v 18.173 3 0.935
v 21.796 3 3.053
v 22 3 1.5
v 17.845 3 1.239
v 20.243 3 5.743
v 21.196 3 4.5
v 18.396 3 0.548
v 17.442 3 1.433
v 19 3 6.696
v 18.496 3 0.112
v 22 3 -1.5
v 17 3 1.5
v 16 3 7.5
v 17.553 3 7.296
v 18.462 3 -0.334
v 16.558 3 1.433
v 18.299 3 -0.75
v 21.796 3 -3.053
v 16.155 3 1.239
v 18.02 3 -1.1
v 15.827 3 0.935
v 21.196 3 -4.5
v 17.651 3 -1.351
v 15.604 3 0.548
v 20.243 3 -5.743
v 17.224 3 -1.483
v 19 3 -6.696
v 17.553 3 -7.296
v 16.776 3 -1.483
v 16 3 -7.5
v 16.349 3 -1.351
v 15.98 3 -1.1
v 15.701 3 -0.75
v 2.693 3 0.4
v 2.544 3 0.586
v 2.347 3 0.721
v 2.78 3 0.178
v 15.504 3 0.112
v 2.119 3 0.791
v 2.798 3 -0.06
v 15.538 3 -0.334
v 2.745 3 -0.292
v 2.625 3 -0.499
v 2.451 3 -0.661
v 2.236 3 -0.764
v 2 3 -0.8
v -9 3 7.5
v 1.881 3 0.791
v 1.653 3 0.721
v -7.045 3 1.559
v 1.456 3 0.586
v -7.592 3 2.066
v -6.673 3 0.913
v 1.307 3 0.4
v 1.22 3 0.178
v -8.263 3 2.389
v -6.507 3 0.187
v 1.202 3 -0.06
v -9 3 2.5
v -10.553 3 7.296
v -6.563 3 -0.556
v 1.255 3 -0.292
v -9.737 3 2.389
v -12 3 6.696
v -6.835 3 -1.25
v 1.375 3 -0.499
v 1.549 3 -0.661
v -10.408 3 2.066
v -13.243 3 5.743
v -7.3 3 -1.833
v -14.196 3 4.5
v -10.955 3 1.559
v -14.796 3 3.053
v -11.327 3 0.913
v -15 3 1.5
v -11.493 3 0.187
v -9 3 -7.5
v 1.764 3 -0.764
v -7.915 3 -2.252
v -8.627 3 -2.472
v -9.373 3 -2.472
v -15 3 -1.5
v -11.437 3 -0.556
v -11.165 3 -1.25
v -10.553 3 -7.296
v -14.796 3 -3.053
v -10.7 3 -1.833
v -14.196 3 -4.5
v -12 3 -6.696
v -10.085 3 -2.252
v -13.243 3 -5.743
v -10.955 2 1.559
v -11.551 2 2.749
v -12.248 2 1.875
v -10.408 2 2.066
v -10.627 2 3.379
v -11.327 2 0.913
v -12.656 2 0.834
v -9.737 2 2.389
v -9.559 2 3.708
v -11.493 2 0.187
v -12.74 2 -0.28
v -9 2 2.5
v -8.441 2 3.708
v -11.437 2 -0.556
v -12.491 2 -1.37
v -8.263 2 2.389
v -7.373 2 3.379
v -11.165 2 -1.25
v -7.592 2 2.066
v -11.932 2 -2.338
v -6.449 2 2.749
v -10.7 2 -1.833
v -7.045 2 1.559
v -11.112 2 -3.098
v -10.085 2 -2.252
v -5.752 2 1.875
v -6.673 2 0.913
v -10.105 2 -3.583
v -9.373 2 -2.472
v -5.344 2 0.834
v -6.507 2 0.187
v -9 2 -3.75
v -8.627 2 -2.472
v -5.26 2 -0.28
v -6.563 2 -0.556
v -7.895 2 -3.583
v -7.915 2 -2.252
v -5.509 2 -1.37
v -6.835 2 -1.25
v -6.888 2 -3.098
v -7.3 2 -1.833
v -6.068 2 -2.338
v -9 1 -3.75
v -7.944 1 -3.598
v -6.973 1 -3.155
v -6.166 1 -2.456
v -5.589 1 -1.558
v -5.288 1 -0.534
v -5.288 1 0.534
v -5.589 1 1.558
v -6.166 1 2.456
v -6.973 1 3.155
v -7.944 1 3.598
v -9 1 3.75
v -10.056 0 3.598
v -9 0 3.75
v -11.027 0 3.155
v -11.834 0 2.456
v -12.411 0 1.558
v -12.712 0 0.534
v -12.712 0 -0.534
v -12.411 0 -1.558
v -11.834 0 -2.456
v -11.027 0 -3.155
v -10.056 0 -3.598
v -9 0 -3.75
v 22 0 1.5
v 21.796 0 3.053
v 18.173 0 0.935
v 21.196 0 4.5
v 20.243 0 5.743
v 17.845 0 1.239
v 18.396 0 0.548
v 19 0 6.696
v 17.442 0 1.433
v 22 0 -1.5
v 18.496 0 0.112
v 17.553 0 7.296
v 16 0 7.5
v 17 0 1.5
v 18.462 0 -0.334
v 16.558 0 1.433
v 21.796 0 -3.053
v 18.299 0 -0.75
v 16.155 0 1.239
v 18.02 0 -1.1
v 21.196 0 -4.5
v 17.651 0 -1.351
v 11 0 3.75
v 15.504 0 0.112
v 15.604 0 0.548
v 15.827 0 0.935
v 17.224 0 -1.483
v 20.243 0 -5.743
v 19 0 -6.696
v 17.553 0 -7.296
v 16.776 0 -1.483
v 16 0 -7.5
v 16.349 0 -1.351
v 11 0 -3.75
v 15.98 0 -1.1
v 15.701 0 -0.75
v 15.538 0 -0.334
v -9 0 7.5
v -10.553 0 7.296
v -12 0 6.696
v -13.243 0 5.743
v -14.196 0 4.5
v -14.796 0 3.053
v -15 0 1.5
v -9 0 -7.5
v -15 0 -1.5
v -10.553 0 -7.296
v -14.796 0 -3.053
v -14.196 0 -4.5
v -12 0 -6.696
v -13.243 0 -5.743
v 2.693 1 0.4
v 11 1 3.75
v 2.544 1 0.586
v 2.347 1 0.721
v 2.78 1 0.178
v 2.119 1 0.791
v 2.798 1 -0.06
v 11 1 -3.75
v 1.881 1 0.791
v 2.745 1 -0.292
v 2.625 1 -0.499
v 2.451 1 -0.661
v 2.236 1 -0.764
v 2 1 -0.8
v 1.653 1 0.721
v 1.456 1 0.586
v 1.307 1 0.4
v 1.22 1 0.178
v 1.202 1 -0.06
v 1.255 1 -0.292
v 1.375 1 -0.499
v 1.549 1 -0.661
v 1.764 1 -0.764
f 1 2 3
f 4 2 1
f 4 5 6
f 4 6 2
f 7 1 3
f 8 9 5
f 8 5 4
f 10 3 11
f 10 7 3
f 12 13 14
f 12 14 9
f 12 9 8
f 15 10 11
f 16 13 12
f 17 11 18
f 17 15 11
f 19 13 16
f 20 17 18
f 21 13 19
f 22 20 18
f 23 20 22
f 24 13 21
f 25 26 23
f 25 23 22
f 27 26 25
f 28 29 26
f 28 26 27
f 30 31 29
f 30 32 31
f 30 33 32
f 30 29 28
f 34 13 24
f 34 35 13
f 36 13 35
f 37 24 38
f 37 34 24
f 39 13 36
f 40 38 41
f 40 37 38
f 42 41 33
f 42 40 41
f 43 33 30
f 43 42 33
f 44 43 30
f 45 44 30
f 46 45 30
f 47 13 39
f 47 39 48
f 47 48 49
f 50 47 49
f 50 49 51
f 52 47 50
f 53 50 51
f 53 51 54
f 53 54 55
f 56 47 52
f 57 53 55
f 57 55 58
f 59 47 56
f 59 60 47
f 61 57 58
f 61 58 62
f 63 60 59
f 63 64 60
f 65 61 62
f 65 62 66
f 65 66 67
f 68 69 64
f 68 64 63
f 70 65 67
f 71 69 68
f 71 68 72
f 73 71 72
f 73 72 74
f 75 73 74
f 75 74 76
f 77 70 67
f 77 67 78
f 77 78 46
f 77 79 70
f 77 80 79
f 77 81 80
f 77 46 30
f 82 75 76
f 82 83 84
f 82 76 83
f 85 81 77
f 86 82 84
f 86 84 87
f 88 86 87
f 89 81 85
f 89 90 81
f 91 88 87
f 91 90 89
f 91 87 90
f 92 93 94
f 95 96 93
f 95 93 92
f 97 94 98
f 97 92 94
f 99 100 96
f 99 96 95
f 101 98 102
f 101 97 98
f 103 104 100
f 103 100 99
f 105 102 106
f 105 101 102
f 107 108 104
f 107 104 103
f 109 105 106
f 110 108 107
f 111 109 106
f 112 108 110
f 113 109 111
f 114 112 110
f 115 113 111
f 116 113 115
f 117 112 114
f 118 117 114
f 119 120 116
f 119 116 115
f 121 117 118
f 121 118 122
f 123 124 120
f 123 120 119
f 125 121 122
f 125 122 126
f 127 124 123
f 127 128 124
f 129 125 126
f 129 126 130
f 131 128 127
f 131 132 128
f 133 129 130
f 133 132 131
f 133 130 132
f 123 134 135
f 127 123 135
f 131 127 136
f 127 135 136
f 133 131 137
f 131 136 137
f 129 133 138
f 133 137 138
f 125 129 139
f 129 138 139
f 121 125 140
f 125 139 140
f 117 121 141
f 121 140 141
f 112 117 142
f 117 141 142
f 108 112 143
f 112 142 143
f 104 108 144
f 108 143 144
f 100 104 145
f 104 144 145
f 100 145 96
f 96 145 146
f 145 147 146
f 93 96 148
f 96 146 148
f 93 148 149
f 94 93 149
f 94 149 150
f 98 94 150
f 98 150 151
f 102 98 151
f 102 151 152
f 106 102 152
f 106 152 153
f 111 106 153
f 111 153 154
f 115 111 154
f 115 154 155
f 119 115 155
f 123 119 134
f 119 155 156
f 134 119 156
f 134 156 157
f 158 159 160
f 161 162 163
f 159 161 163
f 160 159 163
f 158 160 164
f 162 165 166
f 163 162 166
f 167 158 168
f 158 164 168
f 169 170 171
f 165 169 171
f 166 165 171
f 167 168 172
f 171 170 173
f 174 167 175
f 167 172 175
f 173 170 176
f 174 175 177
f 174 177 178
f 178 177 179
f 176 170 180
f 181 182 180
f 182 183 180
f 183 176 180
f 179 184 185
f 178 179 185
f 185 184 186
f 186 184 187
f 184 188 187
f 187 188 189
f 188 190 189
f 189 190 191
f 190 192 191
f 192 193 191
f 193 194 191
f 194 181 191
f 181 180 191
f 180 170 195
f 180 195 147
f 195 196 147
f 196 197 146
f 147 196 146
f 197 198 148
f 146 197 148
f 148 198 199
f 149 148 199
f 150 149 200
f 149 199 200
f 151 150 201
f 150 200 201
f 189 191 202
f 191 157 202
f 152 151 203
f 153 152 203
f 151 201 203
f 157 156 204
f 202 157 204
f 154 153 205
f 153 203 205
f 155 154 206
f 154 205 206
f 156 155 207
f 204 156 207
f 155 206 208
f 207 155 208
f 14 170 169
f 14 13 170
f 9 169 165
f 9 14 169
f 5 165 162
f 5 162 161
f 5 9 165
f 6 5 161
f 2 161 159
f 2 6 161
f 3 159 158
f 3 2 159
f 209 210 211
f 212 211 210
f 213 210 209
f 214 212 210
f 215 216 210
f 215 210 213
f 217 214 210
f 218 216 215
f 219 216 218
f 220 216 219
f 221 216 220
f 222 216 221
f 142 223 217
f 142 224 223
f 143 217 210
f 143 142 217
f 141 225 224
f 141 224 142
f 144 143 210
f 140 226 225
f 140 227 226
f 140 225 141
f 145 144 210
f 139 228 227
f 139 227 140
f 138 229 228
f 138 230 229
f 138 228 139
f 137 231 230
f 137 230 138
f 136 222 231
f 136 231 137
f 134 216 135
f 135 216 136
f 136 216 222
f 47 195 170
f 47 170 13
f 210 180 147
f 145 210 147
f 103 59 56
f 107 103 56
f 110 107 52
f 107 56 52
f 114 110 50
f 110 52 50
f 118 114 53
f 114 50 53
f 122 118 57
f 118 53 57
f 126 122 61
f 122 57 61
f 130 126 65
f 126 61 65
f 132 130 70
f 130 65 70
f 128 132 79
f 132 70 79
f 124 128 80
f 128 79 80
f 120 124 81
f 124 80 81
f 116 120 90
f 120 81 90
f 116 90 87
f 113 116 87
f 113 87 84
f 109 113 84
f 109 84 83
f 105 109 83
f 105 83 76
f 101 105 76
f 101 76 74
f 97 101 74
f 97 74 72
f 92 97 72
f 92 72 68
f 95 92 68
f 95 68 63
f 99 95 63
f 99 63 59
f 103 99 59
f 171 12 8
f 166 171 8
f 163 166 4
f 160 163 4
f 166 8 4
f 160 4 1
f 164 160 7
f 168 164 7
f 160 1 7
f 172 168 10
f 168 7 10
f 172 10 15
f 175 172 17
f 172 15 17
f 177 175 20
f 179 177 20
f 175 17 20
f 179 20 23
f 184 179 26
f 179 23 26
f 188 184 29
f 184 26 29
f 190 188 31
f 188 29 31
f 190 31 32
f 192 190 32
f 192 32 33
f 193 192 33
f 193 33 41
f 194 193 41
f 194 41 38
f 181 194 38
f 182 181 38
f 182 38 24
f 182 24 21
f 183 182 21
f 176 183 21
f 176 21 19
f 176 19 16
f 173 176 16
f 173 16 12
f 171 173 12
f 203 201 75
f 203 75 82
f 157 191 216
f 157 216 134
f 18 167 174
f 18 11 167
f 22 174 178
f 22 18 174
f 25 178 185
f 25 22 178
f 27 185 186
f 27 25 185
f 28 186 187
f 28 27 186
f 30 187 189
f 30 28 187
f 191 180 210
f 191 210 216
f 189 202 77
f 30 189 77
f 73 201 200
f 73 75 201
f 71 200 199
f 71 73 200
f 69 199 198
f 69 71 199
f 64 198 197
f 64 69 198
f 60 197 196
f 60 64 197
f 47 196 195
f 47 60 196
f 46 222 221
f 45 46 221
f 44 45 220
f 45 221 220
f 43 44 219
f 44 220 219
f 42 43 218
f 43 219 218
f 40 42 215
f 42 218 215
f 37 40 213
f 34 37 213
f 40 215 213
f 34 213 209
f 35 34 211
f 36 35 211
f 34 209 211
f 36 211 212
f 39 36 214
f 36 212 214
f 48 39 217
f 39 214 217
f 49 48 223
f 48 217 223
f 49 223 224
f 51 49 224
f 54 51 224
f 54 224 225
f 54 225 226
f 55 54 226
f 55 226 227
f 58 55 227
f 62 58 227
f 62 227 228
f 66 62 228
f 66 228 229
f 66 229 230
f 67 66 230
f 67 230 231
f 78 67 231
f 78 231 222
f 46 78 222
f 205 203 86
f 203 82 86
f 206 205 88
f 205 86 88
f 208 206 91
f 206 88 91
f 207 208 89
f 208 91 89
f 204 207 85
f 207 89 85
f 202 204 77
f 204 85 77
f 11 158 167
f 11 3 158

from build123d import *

# Parameters (mm, degrees)
SKETCH1_W           = 30
SKETCH1_H           = 15
BOSS_EXTRUDE2_DEPTH = 3
CUT_EXTRUDE1_REACH  = 19.037
SKETCH3_R           = 2.5
FILLET1_R           = 6
SKETCH5_W           = 12
SKETCH5_H           = 3
BOSS_EXTRUDE3_DEPTH = 10
SKETCH6_R           = 3.75
CUT_EXTRUDE4_DEPTH  = 2
SKETCH7_W           = 20
SKETCH7_H           = 7.5
CUT_EXTRUDE5_DEPTH  = 1
CUT_EXTRUDE6_REACH  = 25.135
SKETCH8_R           = 0.8
CUT_EXTRUDE7_REACH  = 25.243
SKETCH9_W           = 12
SKETCH9_H           = 10
SKETCH10_W          = 15
SKETCH10_H          = 3
BOSS_EXTRUDE4_DEPTH = 7
CUT_EXTRUDE8_REACH  = 25.436
SKETCH11_R          = 1.5
FILLET2_R           = 6


with BuildPart() as part:
    # Sketch1 → Boss-Extrude2 (new body)
    with BuildSketch(Plane(origin=(0, 0, 0), x_dir=(1, 0, 0), z_dir=(0, 1, 0))):
        Rectangle(SKETCH1_W, SKETCH1_H)
    extrude(amount=BOSS_EXTRUDE2_DEPTH)

    # Sketch3 → Cut-Extrude1 (cut, up to next)
    with BuildSketch(Plane(origin=(0, 3, 0), x_dir=(1, 0, 0), z_dir=(0, 1, 0)), mode=Mode.PRIVATE) as cut_extrude1_sk1:
        with Locations(Location((-9, 0, 0), (0, 0, 270))):
            Circle(SKETCH3_R)
    cut_extrude1_tool1 = extrude(cut_extrude1_sk1.sketch, amount=-CUT_EXTRUDE1_REACH, mode=Mode.PRIVATE) & part.part
    add(cut_extrude1_tool1.solids().sort_by_distance((-9, 3, 0))[0], mode=Mode.SUBTRACT)

    # Fillet1
    fillet1_edges = [part.edges().sort_by_distance(p)[0] for p in [
        (-15, 1.5, 7.5),
        (-15, 1.5, -7.5),
    ]]
    fillet(fillet1_edges, radius=FILLET1_R)

    # Sketch5 → Boss-Extrude3 (add)
    with BuildSketch(Plane.XY.offset(7.5)):
        with Locations((9, 1.5)):
            Rectangle(SKETCH5_W, SKETCH5_H)
    extrude(amount=BOSS_EXTRUDE3_DEPTH)

    # Sketch6 → Cut-Extrude4 (cut)
    with BuildSketch(Plane(origin=(0, 0, 0), x_dir=(-1, 0, 0), z_dir=(0, -1, 0))):
        with Locations(Location((9, 0, 0), (0, 0, 90))):
            Circle(SKETCH6_R)
    extrude(amount=-CUT_EXTRUDE4_DEPTH, mode=Mode.SUBTRACT)

    # Sketch7 → Cut-Extrude5 (cut)
    with BuildSketch(Plane(origin=(0, 0, 0), x_dir=(-1, 0, 0), z_dir=(0, -1, 0))):
        with Locations((-1, 0)):
            Rectangle(SKETCH7_W, SKETCH7_H)
    extrude(amount=-CUT_EXTRUDE5_DEPTH, mode=Mode.SUBTRACT)

    # Sketch8 → Cut-Extrude6 (cut, up to next)
    with BuildSketch(Plane(origin=(0, 1, 0), x_dir=(-1, 0, 0), z_dir=(0, -1, 0)), mode=Mode.PRIVATE) as cut_extrude6_sk1:
        with Locations(Location((-2, 0, 0), (0, 0, 90))):
            Circle(SKETCH8_R)
    cut_extrude6_tool1 = extrude(cut_extrude6_sk1.sketch, amount=-CUT_EXTRUDE6_REACH, mode=Mode.PRIVATE) & part.part
    add(cut_extrude6_tool1.solids().sort_by_distance((2, 1, 0))[0], mode=Mode.SUBTRACT)

    # Sketch9 → Cut-Extrude7 (cut, up to next)
    with BuildSketch(Plane(origin=(0, 0, 0), x_dir=(1, 0, 0), z_dir=(0, 1, 0)), mode=Mode.PRIVATE) as cut_extrude7_sk1:
        with Locations((9, -12.5)):
            Rectangle(SKETCH9_W, SKETCH9_H)
    cut_extrude7_tool1 = extrude(cut_extrude7_sk1.sketch, amount=CUT_EXTRUDE7_REACH, mode=Mode.PRIVATE) & part.part
    add(cut_extrude7_tool1.solids().sort_by_distance((9, 0, 12.5))[0], mode=Mode.SUBTRACT)

    # Sketch10 → Boss-Extrude4 (add)
    with BuildSketch(Plane(origin=(15, 0, 0), x_dir=(0, 0, -1), z_dir=(1, 0, 0))):
        with Locations((0, 1.5)):
            Rectangle(SKETCH10_W, SKETCH10_H)
    extrude(amount=BOSS_EXTRUDE4_DEPTH)

    # Sketch11 → Cut-Extrude8 (cut, up to next)
    with BuildSketch(Plane(origin=(0, 3, 0), x_dir=(1, 0, 0), z_dir=(0, 1, 0)), mode=Mode.PRIVATE) as cut_extrude8_sk1:
        with Locations(Location((17, 0, 0), (0, 0, 270))):
            Circle(SKETCH11_R)
    cut_extrude8_tool1 = extrude(cut_extrude8_sk1.sketch, amount=-CUT_EXTRUDE8_REACH, mode=Mode.PRIVATE) & part.part
    add(cut_extrude8_tool1.solids().sort_by_distance((17, 3, 0))[0], mode=Mode.SUBTRACT)

    # Fillet2
    fillet2_edges = [part.edges().sort_by_distance(p)[0] for p in [
        (22, 1.5, -7.5),
        (22, 1.5, 7.5),
    ]]
    fillet(fillet2_edges, radius=FILLET2_R)


solid = part.part
